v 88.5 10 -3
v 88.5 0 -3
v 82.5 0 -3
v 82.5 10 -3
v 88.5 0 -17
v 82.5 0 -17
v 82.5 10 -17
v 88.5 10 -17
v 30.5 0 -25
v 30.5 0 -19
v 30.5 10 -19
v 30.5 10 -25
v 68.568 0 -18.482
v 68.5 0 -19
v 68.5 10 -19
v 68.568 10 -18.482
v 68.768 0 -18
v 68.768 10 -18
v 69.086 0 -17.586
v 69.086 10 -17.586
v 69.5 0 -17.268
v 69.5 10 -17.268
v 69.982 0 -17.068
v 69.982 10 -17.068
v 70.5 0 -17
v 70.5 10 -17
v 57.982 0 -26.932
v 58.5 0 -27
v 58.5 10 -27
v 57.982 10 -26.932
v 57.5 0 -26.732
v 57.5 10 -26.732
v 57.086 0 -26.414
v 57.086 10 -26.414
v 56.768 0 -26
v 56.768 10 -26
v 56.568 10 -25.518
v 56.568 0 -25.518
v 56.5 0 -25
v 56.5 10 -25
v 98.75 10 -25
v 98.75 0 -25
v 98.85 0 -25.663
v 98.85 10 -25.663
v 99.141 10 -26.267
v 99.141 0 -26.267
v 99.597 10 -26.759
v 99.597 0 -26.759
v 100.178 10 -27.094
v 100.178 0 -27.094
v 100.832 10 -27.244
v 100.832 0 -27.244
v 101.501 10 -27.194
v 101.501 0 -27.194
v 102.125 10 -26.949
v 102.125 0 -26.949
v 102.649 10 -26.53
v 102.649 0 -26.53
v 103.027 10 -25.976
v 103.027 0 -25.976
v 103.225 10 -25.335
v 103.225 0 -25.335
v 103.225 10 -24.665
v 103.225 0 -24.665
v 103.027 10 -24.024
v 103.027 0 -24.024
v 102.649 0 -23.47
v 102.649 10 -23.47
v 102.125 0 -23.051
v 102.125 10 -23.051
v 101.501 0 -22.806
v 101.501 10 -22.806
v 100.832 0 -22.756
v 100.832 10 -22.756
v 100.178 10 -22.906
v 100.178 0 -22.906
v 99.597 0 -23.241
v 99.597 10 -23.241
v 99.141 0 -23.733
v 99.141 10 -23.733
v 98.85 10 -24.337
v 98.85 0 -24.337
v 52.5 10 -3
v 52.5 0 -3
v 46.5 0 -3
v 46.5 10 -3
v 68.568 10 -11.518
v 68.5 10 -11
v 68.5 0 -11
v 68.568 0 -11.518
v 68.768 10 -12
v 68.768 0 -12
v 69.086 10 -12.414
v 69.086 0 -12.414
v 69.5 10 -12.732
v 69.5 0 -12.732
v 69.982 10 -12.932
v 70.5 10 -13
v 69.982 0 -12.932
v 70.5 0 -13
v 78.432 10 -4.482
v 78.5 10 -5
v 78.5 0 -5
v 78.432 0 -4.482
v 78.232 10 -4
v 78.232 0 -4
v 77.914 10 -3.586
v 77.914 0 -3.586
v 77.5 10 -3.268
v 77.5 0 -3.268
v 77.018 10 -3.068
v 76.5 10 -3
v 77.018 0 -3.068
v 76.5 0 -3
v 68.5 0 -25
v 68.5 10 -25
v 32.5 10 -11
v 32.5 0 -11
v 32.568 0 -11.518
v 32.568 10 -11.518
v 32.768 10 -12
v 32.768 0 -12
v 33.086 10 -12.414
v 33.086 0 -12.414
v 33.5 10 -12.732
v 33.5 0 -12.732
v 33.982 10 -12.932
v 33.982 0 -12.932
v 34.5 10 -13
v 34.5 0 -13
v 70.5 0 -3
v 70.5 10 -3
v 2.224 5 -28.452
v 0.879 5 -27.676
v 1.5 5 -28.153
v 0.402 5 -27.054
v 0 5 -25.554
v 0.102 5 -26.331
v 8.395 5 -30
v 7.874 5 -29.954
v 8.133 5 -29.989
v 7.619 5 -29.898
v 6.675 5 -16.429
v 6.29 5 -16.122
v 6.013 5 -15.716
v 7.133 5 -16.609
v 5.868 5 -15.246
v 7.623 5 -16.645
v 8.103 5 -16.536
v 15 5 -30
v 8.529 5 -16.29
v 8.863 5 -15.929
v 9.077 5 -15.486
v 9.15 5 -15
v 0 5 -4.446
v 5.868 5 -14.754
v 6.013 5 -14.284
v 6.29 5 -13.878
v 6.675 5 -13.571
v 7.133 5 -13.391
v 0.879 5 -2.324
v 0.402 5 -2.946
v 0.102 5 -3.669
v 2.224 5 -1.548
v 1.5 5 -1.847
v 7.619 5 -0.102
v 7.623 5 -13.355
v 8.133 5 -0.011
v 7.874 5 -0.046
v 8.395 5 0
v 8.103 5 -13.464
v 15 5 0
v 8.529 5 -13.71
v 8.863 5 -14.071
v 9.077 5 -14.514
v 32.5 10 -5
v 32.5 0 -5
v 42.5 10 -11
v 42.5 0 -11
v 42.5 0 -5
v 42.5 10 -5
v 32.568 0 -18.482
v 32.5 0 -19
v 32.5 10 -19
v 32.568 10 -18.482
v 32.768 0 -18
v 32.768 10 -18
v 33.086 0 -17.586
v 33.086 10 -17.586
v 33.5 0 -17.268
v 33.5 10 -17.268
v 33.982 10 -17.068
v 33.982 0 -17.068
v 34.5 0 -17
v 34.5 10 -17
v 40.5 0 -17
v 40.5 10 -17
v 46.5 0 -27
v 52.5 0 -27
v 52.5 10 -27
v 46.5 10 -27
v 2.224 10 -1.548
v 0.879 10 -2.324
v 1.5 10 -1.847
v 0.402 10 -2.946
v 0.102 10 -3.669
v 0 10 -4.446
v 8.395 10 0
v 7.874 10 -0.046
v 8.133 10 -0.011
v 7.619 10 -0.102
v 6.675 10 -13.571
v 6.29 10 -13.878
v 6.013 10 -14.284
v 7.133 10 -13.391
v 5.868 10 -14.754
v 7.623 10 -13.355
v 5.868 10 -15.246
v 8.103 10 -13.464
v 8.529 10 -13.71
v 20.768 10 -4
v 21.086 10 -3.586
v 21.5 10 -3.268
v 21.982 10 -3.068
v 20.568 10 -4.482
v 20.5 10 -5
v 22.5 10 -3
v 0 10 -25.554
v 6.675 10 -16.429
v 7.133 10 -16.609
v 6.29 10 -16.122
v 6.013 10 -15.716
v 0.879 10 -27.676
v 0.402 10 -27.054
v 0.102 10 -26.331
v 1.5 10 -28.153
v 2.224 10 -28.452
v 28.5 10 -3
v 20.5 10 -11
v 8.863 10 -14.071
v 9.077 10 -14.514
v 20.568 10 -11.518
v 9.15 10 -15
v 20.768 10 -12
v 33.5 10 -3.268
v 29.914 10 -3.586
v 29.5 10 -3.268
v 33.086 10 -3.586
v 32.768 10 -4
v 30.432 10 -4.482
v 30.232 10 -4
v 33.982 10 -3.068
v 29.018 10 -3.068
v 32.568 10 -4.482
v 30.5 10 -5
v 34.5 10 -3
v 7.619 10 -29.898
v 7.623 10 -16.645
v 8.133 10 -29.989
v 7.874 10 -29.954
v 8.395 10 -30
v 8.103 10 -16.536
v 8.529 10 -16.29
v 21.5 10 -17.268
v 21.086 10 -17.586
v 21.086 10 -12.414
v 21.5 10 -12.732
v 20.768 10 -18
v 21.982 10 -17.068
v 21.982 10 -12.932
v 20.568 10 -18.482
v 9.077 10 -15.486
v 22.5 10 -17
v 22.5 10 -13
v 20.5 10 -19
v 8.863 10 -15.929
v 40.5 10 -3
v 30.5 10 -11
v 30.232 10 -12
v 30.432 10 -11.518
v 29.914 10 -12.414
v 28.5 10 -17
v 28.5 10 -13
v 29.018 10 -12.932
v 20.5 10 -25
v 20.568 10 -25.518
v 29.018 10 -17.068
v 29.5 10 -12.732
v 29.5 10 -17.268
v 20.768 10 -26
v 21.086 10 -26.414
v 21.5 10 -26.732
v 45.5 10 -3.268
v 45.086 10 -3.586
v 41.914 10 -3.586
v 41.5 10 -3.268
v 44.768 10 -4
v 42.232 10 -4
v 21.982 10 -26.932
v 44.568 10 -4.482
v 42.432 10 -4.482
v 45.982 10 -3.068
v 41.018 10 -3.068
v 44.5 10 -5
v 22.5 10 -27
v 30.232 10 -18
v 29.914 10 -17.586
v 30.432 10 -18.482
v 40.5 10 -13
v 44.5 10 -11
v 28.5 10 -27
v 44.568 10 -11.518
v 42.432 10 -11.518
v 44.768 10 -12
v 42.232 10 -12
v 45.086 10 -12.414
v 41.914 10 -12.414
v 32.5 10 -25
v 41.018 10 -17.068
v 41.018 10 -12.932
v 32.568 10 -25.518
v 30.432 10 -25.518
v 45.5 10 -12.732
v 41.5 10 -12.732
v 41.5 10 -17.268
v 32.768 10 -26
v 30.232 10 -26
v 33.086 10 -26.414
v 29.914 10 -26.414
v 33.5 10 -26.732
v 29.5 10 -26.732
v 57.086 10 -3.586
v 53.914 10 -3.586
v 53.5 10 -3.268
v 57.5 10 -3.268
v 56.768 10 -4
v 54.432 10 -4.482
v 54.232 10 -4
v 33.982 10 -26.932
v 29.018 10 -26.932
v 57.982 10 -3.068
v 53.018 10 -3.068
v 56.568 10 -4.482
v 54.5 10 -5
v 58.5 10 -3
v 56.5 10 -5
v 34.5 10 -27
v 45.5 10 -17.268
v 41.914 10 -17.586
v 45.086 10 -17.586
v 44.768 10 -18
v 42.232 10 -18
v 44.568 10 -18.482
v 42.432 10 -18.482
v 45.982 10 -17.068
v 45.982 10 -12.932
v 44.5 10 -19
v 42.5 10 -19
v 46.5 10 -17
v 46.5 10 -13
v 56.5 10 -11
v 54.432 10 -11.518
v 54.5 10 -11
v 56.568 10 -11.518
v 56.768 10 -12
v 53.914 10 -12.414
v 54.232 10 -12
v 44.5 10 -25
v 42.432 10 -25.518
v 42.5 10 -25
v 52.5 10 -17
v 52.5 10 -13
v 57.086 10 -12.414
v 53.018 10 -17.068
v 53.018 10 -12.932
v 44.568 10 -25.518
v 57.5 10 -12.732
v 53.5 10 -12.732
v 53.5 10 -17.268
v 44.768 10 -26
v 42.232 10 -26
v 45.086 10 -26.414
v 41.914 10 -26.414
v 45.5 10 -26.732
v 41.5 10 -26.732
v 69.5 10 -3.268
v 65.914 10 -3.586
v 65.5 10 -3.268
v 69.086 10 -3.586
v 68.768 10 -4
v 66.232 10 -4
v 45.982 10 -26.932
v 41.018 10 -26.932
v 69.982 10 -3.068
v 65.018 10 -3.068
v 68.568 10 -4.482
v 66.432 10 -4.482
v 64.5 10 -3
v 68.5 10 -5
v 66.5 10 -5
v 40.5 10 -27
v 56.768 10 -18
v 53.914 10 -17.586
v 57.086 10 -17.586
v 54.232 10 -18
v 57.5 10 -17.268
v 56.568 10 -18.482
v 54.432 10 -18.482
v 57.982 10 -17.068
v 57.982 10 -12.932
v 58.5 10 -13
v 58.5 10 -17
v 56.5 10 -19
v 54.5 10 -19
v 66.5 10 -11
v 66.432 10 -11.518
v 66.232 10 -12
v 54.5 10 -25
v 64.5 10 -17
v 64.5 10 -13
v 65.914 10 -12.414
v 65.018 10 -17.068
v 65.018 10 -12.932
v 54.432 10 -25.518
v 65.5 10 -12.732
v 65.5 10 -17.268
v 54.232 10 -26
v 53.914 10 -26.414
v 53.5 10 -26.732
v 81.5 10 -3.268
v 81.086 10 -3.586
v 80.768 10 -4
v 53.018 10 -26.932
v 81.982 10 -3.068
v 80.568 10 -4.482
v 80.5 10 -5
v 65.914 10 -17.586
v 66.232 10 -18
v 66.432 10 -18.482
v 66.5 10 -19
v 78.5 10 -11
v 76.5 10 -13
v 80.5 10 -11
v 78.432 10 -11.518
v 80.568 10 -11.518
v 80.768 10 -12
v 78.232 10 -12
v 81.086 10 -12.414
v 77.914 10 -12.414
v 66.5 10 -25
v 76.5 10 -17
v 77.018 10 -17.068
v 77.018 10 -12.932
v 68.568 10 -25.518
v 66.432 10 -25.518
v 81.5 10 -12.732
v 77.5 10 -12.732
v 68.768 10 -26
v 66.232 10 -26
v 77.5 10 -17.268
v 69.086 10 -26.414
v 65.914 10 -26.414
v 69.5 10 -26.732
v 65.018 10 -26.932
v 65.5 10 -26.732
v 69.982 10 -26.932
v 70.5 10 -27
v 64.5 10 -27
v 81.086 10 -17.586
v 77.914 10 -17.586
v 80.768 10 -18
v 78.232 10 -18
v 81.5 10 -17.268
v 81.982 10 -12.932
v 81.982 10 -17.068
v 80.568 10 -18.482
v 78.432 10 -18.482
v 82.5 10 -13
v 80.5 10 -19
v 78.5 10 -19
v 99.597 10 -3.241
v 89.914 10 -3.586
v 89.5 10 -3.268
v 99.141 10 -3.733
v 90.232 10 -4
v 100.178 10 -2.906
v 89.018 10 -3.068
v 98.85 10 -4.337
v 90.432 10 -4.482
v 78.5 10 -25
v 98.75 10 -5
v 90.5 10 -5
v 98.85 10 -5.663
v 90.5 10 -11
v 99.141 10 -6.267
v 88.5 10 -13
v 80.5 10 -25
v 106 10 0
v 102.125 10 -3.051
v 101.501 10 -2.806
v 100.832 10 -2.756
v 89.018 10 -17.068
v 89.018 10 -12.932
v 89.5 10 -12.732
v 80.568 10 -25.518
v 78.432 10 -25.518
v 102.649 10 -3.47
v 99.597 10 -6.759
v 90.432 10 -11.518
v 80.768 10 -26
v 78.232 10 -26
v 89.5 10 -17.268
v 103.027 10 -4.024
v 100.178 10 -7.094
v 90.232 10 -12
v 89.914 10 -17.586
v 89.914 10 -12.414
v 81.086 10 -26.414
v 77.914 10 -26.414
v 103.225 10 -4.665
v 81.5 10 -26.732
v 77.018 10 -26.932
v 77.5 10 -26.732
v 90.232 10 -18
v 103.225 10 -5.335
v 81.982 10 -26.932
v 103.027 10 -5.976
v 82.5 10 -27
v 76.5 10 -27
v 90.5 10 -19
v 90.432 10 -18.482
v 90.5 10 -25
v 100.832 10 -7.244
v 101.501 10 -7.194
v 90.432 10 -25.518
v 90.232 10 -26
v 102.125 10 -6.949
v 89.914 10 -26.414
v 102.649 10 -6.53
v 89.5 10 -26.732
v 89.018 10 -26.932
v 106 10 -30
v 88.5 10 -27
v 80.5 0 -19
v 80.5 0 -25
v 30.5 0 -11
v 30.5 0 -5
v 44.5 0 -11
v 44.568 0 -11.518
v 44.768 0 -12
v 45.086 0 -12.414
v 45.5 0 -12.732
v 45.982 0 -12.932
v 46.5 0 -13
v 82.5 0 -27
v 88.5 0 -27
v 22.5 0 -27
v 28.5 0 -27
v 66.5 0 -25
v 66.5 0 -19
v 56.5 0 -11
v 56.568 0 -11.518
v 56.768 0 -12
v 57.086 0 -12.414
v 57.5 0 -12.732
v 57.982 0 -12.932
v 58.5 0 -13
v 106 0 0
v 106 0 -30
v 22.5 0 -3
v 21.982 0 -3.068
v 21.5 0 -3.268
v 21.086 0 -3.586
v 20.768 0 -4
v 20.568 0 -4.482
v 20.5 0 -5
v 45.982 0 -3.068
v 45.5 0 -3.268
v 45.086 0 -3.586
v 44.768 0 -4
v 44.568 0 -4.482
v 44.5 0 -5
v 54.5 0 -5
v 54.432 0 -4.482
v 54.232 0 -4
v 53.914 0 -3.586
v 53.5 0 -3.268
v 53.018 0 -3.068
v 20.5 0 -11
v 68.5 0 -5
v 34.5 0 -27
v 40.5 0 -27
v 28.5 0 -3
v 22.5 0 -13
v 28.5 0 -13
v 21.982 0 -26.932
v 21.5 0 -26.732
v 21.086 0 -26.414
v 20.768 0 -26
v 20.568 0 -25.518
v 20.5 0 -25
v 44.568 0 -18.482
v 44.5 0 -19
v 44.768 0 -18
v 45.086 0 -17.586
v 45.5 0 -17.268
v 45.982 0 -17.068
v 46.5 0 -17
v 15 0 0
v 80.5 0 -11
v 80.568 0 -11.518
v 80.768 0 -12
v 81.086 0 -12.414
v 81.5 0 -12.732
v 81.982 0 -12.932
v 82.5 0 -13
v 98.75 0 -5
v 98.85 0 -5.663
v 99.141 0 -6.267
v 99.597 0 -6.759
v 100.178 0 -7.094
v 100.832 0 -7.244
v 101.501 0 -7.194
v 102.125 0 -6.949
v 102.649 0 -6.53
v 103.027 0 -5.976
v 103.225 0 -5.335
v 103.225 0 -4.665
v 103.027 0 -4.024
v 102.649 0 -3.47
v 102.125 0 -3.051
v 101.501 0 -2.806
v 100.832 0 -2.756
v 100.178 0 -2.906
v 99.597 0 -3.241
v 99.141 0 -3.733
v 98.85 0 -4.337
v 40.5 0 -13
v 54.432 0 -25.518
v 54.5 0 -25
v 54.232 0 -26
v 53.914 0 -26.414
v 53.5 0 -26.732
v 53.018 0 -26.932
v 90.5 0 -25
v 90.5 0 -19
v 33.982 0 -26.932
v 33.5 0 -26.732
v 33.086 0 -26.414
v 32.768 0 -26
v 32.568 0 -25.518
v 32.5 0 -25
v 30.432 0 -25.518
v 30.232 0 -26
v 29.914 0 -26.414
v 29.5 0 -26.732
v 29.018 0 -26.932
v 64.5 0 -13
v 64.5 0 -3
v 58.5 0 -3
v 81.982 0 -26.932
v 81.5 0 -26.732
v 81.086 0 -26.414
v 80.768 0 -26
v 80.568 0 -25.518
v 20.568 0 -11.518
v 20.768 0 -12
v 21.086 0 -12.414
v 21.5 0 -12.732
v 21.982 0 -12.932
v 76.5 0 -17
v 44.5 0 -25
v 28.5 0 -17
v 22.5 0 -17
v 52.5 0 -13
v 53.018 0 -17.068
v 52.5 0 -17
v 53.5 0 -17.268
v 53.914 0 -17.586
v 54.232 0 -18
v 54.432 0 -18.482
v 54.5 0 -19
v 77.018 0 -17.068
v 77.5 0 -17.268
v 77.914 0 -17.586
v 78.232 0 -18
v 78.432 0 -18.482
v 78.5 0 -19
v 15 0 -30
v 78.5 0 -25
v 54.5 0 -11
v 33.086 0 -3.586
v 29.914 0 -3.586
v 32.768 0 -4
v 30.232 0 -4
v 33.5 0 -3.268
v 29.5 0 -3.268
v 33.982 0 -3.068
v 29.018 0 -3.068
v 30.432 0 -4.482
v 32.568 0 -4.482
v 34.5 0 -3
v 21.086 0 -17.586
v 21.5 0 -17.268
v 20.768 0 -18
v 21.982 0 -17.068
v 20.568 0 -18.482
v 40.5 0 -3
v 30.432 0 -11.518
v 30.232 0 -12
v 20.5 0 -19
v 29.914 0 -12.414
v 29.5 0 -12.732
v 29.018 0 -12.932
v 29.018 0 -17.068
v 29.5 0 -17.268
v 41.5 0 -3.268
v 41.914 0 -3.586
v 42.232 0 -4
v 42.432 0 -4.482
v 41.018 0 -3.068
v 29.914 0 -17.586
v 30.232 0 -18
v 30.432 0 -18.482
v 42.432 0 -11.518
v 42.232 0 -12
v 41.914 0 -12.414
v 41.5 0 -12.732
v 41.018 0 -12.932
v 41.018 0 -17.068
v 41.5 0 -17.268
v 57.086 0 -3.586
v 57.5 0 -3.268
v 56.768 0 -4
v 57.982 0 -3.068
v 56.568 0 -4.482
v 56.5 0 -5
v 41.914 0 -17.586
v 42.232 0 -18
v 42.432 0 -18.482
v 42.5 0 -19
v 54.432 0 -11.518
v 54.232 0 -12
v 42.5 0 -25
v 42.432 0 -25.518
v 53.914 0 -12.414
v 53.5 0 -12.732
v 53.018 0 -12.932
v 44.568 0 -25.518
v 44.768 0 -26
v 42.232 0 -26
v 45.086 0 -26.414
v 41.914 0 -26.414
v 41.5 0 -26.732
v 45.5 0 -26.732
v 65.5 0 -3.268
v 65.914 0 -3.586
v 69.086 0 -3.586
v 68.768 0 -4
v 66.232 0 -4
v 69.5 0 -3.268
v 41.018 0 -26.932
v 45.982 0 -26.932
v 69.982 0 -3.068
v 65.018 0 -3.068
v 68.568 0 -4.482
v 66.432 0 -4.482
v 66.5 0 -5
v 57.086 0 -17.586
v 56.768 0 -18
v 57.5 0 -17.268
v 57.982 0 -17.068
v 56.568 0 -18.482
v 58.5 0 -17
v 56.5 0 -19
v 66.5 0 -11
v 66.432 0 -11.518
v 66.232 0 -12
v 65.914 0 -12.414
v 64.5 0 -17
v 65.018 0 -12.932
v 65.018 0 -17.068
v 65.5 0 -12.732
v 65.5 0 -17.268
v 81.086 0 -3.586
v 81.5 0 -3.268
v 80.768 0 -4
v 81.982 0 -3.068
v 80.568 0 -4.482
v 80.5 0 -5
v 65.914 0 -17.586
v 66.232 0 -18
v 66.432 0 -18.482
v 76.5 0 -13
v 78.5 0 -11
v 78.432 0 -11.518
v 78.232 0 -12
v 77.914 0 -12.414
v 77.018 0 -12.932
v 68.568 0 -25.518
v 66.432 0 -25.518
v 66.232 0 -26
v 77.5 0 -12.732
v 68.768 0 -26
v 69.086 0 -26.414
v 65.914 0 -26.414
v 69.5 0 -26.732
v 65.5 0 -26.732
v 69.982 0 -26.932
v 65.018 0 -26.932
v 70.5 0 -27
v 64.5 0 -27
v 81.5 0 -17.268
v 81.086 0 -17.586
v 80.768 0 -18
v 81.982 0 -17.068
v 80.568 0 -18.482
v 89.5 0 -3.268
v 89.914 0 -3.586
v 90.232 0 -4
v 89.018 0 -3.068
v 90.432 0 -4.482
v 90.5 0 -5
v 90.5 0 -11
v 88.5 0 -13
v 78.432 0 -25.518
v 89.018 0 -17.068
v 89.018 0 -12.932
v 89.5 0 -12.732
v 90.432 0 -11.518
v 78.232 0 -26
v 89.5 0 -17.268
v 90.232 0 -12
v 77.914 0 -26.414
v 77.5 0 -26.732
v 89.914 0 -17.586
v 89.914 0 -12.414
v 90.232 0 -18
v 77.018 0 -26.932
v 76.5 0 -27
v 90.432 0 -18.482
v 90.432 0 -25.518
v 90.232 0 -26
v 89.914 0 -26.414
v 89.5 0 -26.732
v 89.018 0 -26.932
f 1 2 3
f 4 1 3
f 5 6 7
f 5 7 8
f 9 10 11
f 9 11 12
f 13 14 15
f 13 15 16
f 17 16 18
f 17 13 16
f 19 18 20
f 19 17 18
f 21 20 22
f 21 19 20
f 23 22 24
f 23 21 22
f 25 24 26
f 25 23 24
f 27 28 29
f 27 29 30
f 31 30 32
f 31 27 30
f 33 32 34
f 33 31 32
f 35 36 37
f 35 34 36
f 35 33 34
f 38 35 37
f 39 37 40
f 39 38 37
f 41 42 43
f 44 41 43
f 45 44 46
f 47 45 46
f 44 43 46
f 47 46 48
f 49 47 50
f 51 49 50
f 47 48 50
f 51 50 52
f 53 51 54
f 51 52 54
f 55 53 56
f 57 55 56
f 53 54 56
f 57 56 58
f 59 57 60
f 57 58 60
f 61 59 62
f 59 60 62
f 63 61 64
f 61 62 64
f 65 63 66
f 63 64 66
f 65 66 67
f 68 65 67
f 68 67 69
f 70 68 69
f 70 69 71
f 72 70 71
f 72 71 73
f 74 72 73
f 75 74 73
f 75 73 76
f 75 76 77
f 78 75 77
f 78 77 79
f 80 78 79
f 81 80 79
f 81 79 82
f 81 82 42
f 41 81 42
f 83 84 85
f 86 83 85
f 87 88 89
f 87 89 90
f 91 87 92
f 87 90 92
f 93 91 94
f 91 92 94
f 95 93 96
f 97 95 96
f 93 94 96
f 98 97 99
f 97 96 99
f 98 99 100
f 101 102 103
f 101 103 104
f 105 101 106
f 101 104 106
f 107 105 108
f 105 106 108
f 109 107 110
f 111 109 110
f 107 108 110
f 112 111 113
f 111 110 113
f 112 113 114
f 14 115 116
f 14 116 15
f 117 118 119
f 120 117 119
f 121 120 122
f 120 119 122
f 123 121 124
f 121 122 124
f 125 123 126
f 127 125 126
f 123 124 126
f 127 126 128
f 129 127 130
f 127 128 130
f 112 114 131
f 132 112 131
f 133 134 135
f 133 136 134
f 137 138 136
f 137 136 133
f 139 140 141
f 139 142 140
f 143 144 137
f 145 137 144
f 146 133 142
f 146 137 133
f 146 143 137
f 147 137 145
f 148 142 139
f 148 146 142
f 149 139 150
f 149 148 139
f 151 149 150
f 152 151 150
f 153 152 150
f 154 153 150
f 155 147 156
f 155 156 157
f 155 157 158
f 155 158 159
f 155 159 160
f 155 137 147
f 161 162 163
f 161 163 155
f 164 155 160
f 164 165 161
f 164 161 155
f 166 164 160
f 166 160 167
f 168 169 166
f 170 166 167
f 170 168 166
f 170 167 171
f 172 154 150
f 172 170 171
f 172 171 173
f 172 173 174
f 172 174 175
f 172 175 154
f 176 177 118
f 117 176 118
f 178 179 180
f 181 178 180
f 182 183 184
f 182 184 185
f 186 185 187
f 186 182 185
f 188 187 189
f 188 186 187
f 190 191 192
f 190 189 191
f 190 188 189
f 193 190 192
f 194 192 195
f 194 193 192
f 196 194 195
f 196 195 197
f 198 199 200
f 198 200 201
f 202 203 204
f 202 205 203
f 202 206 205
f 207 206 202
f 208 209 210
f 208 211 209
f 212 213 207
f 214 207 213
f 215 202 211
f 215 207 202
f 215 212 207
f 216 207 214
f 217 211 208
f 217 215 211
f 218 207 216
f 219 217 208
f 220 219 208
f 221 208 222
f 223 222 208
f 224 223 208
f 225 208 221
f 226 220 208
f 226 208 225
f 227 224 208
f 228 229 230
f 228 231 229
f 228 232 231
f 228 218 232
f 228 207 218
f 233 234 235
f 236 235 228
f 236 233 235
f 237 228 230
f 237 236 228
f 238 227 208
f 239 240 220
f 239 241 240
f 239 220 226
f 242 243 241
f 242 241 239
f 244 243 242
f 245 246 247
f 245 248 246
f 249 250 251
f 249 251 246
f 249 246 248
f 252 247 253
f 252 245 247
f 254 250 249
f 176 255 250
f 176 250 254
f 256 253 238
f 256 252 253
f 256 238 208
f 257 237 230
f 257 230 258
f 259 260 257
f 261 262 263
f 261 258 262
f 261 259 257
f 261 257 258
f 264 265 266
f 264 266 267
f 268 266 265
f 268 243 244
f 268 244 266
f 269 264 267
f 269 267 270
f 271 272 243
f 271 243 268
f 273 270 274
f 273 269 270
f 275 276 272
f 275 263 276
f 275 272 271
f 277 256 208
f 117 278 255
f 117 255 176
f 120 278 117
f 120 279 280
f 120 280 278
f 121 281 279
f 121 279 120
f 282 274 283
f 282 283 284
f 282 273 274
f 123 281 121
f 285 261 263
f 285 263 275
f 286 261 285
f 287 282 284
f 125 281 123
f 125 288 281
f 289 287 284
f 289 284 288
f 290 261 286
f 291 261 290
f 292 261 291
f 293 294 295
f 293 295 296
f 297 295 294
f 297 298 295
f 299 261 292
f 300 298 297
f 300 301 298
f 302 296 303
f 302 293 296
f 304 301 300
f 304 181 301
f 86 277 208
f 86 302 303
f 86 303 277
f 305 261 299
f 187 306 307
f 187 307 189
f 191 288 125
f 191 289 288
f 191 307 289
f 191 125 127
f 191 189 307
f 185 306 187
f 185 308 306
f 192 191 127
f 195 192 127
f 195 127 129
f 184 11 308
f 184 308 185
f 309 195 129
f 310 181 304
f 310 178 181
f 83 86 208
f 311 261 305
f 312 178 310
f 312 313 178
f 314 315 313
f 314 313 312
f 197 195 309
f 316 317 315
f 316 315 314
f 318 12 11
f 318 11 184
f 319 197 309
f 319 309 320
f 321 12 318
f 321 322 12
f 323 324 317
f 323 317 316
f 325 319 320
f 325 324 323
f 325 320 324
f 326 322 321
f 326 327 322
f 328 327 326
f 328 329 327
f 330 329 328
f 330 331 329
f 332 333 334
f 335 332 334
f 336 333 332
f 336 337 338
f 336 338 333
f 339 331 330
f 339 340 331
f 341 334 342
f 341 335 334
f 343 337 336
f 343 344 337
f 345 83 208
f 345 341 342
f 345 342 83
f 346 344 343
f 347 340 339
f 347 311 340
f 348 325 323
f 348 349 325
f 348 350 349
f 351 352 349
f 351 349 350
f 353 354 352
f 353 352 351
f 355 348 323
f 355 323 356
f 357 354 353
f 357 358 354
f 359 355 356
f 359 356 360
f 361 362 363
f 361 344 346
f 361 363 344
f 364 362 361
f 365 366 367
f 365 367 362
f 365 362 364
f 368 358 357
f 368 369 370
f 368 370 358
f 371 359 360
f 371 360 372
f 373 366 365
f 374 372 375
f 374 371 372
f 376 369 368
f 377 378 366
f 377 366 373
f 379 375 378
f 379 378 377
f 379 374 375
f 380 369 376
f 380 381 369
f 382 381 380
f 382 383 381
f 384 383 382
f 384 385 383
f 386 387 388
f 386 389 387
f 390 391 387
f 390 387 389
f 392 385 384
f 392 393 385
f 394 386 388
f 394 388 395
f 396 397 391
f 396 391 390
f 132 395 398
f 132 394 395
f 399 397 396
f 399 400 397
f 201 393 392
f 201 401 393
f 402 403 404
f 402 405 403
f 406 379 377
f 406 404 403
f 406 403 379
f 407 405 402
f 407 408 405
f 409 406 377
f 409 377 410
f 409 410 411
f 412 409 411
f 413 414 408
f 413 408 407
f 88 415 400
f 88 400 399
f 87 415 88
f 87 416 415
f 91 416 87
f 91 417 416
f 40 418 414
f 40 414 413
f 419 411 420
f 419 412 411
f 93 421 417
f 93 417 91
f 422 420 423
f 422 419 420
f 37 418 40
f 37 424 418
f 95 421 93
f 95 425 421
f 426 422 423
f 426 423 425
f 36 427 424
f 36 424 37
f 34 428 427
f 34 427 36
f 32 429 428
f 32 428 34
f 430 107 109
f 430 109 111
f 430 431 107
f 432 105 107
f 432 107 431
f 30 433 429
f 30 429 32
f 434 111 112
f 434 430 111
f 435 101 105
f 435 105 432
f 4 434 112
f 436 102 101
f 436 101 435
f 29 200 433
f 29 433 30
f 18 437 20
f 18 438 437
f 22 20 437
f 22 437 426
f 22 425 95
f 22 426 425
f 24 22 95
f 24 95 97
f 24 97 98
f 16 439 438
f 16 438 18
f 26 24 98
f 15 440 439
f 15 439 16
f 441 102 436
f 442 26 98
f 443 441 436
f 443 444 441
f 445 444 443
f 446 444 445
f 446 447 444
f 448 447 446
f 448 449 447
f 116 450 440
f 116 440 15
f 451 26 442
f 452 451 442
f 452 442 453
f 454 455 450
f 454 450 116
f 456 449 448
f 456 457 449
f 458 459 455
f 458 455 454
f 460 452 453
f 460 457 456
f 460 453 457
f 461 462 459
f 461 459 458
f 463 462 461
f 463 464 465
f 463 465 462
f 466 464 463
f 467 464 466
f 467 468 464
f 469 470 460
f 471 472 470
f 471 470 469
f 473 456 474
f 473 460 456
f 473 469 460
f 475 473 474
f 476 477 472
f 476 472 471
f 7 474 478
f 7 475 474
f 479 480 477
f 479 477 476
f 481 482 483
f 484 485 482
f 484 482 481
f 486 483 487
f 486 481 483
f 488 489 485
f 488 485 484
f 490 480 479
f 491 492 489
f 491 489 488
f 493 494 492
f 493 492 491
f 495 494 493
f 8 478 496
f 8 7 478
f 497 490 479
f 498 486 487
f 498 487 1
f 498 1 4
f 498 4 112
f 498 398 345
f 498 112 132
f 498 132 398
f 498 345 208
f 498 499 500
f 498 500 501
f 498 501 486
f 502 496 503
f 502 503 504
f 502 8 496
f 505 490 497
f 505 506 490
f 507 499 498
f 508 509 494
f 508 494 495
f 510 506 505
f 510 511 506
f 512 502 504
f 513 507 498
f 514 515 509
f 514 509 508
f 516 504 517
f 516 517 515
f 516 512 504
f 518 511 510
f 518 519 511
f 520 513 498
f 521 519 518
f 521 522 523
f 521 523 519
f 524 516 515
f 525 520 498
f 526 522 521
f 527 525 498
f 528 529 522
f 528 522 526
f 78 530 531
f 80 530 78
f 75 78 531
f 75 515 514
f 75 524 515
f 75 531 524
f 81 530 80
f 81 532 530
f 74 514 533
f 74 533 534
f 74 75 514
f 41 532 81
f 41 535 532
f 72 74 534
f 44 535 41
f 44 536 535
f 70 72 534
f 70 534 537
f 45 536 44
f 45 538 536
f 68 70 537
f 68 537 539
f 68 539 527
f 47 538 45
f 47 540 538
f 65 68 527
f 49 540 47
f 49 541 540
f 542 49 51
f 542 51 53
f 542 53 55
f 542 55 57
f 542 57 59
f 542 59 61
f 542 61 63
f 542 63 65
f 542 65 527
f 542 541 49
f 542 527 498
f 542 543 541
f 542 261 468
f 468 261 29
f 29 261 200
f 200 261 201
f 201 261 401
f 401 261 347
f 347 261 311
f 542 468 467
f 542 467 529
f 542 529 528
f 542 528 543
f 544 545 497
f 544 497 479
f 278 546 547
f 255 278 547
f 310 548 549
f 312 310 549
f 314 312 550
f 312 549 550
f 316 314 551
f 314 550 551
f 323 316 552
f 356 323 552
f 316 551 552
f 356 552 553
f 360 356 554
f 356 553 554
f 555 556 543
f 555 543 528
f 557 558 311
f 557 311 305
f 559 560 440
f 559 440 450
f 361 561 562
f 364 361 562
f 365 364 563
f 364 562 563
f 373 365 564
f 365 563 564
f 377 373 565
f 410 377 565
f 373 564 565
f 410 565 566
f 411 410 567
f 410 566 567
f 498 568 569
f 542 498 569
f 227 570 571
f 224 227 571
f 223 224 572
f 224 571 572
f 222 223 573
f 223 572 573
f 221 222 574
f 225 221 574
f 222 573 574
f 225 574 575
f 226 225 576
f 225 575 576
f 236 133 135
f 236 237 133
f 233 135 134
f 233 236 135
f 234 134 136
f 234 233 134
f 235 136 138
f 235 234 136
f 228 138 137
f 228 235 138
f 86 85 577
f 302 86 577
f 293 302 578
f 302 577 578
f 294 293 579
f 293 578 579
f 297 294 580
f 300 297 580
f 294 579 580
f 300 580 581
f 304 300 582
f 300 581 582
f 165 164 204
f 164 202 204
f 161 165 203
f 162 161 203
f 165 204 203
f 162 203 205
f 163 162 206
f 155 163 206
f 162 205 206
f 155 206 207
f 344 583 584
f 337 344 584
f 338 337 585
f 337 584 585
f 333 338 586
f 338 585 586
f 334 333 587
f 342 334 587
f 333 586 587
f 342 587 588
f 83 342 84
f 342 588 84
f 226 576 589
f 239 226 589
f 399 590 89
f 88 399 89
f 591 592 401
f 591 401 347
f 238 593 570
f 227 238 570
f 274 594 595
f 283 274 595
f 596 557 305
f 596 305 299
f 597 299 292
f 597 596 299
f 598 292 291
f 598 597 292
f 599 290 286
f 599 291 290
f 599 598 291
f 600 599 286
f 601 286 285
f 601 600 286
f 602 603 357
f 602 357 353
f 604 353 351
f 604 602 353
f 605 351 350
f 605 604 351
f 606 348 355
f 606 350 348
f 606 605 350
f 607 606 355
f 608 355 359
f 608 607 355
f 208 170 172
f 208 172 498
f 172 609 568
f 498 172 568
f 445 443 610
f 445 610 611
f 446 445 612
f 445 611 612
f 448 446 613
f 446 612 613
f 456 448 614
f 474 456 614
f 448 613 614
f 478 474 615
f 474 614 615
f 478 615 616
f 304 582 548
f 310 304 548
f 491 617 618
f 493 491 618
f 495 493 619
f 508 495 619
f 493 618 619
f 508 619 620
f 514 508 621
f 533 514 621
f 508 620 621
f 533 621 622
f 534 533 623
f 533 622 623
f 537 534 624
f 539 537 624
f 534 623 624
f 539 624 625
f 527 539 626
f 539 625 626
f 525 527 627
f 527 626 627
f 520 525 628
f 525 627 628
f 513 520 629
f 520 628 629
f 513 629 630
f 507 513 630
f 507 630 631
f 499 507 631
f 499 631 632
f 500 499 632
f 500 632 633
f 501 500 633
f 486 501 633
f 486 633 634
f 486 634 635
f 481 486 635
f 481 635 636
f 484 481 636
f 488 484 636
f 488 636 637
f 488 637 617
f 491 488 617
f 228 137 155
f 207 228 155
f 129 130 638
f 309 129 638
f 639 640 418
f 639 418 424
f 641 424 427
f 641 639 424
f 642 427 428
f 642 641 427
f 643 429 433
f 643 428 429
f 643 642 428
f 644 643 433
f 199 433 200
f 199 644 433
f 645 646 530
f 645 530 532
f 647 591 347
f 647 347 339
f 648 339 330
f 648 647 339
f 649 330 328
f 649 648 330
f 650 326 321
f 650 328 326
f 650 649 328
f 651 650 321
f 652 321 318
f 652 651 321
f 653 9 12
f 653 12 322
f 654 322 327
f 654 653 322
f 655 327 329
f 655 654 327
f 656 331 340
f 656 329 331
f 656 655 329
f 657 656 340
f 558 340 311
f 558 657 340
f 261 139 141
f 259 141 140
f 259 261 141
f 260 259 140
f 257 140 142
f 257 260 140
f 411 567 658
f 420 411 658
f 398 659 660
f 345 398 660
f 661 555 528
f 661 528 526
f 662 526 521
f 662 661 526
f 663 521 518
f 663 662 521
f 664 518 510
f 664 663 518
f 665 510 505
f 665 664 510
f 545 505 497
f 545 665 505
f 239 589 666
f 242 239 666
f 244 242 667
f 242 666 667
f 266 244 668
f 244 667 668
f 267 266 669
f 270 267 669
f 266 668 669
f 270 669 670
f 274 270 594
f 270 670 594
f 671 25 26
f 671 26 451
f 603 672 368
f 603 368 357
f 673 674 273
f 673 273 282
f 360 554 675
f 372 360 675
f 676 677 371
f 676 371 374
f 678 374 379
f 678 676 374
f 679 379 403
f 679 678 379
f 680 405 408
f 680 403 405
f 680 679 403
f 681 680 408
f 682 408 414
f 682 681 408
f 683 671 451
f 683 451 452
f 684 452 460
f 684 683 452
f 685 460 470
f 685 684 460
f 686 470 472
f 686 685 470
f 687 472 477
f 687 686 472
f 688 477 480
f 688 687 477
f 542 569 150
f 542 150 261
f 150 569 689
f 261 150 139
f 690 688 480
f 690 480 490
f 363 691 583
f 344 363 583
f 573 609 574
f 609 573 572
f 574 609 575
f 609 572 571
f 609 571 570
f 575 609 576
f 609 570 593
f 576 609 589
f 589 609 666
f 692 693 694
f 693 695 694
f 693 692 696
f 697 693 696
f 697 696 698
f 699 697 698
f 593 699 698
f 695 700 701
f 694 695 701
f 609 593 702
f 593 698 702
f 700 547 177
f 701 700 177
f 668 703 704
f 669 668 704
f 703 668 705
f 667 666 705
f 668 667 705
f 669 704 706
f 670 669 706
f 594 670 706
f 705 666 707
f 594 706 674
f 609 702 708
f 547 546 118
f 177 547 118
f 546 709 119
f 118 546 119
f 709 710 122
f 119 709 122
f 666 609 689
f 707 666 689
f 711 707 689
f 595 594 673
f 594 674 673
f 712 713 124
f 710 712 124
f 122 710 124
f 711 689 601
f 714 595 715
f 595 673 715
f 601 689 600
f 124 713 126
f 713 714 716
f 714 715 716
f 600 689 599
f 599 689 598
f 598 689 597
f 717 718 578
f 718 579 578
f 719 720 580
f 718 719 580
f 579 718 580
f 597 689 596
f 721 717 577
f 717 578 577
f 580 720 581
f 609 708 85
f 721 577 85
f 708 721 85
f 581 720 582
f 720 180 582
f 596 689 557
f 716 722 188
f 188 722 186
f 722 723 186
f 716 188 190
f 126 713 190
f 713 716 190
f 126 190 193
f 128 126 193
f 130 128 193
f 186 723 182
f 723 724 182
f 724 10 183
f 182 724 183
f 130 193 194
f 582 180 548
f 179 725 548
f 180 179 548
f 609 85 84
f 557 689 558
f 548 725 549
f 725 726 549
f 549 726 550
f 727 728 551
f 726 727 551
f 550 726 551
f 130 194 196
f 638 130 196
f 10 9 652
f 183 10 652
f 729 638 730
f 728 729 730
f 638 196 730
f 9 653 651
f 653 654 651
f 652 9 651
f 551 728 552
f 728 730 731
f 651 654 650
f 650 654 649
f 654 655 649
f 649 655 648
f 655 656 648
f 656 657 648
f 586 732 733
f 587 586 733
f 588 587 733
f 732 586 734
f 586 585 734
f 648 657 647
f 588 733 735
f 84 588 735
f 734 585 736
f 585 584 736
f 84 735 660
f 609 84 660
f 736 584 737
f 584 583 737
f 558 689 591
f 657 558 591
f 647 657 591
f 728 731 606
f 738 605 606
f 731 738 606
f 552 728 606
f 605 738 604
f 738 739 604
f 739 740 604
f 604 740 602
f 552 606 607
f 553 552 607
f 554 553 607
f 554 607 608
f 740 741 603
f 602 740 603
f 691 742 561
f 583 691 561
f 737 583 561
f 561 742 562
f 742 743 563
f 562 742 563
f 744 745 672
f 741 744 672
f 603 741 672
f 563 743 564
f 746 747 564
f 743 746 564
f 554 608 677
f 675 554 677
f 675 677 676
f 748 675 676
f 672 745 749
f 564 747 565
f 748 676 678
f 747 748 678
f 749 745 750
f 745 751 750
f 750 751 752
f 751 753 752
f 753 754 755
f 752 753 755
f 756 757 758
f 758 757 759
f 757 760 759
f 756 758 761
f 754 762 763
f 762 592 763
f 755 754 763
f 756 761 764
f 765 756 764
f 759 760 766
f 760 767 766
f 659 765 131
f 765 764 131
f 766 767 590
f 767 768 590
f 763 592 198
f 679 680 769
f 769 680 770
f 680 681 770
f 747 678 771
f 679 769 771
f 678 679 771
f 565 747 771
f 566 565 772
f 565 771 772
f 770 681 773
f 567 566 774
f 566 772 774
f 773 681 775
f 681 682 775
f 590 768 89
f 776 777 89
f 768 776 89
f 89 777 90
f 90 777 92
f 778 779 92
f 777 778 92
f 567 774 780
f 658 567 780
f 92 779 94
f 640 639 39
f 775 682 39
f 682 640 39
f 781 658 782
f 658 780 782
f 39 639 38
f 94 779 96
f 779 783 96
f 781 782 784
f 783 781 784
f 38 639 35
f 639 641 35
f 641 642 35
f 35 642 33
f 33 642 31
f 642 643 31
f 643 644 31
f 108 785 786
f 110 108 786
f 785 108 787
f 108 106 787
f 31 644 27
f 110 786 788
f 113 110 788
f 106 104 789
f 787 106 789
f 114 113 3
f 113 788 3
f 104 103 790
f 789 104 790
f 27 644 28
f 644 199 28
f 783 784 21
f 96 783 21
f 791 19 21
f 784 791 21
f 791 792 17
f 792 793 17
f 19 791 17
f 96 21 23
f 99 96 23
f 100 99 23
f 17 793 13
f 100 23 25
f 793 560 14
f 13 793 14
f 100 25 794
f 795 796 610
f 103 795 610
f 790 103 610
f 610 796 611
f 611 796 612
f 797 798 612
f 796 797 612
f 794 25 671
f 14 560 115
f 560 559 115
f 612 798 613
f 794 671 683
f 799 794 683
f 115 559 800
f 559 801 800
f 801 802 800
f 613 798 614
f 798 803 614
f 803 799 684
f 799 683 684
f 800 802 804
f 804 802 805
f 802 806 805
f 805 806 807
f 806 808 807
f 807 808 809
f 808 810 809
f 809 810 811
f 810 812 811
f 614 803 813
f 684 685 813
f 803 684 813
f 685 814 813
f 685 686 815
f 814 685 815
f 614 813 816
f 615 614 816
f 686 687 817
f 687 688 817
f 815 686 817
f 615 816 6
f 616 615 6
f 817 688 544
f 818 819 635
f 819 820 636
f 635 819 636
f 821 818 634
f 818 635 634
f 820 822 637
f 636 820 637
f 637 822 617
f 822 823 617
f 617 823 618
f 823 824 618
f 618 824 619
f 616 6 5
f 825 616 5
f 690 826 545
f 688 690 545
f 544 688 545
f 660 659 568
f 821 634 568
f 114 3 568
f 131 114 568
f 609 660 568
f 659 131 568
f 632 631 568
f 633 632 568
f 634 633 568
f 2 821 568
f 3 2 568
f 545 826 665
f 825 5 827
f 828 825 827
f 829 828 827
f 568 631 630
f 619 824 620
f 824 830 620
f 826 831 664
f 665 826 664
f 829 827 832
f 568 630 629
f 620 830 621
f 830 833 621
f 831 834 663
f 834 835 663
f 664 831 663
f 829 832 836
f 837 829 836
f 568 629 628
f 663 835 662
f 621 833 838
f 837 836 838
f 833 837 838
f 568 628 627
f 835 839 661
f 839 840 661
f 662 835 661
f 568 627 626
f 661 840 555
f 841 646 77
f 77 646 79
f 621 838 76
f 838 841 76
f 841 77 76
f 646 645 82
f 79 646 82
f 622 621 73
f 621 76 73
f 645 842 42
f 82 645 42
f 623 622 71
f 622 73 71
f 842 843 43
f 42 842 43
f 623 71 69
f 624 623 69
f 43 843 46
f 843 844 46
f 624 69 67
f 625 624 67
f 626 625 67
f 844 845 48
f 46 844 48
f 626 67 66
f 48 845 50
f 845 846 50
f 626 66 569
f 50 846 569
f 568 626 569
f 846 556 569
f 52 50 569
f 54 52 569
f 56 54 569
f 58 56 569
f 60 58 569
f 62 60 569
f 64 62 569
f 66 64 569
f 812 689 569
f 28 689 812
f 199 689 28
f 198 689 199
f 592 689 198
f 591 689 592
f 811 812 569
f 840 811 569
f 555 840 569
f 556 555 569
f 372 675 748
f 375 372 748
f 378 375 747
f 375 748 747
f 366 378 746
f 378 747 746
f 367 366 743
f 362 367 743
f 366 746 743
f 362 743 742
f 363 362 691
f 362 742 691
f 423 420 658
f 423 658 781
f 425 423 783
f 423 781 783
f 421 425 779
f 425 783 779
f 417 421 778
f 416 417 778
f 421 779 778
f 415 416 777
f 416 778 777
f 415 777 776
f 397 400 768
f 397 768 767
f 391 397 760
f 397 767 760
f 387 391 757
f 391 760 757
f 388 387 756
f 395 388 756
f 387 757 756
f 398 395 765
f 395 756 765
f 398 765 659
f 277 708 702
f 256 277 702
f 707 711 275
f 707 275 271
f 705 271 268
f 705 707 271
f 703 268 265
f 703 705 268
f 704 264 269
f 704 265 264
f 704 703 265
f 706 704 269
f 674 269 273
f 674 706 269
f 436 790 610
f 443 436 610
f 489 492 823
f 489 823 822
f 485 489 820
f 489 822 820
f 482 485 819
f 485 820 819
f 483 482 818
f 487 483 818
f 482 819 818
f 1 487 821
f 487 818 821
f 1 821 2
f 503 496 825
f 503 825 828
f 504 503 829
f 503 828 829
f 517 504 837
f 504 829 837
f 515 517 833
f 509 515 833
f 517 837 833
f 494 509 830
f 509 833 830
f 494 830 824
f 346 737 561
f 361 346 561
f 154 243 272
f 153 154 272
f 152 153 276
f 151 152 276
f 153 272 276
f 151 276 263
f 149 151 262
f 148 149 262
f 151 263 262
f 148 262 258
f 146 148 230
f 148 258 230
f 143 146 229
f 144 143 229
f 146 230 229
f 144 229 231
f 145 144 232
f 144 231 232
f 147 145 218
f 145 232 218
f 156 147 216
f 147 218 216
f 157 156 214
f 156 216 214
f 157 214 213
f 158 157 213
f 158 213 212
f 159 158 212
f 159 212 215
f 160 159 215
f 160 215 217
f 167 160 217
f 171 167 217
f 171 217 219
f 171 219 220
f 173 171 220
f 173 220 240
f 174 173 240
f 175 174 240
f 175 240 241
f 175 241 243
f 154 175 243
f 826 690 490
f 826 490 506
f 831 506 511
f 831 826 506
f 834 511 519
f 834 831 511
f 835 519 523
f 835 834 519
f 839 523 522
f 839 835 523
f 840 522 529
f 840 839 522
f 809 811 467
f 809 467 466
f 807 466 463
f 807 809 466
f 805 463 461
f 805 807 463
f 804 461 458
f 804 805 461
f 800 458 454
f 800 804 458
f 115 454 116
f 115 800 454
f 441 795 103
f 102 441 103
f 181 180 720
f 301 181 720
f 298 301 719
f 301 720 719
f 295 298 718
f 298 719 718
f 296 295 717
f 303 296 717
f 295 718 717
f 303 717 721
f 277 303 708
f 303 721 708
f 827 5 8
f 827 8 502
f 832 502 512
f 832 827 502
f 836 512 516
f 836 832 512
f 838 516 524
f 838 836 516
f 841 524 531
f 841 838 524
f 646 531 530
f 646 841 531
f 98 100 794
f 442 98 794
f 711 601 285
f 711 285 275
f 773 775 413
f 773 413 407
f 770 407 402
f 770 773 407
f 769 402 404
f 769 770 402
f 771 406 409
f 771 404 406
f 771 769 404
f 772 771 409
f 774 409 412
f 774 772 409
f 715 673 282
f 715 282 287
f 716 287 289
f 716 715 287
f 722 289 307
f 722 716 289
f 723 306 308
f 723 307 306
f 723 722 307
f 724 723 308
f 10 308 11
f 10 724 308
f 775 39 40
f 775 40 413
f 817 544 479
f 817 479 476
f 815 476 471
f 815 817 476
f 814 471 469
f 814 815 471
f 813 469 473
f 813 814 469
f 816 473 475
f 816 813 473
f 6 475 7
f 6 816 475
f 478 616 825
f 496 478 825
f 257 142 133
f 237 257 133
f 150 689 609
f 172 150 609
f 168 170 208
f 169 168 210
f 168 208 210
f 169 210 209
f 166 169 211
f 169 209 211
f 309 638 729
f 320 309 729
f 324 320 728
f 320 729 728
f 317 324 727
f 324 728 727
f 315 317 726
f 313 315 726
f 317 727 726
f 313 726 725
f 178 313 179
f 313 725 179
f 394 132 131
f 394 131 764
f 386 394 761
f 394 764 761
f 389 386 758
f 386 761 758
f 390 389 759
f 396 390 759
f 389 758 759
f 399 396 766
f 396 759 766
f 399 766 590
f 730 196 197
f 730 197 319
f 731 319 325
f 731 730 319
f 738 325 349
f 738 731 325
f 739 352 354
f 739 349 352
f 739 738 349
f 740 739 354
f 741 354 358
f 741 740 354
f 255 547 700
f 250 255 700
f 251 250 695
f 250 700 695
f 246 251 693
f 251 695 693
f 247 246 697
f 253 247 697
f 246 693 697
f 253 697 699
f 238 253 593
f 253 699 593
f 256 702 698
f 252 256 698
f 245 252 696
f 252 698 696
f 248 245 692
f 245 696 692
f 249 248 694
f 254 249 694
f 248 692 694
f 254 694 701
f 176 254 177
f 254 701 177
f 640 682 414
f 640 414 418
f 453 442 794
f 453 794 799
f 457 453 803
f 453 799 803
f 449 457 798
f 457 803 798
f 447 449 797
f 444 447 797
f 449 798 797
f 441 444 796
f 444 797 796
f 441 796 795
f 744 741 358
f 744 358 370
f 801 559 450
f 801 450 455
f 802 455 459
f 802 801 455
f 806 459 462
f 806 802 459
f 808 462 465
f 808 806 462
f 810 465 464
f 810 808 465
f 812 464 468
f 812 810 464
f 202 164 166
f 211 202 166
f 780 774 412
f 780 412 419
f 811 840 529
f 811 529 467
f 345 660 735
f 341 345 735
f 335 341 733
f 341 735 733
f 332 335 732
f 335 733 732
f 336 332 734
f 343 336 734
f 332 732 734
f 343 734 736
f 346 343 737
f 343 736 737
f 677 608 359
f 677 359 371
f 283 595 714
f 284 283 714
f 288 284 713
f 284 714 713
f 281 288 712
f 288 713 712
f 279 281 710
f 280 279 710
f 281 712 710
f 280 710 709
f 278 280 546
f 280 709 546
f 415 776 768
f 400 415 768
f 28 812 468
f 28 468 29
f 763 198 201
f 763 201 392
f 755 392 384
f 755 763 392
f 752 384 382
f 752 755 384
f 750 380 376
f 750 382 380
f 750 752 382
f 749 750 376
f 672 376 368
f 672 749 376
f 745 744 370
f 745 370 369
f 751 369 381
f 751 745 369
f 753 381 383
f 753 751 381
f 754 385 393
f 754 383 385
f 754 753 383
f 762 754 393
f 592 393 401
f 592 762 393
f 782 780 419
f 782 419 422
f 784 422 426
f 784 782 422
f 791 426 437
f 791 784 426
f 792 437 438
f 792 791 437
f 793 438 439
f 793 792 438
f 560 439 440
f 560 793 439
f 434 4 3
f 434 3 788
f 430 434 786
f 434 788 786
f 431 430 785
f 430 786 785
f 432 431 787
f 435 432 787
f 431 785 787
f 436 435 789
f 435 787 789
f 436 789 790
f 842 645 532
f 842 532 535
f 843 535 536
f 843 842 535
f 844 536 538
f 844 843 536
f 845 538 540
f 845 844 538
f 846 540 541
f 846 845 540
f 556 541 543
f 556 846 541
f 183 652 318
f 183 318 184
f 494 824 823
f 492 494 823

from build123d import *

# Parameters (mm, degrees)
EXTRUDE_1_DEPTH     = 10
SKETCH_4_W          = 15
SKETCH_4_H          = 30
CUT_EXTRUDE_2_DEPTH = 5
FILLET_1_R          = 3
CUT_EXTRUDE_3_DEPTH = 111.616454472
HOLE_WIZARD_M41_D   = 4.5
M4X0_71_D           = 3.3


with BuildPart() as part:
    # Эскиз1 → Бобышка-Вытянуть1 (new body)
    with BuildSketch(Plane(origin=(0, 0, 0), x_dir=(1, 0, 0), z_dir=(0, 1, 0))):
        Polygon((15, 0), (106, 0), (106, 30), (15, 30), (8, 30), (0, 27.856406461), (0, 2.143593539), (8, 0), align=None)
    extrude(amount=EXTRUDE_1_DEPTH)

    # Эскиз4 → Вырез-Вытянуть2 (cut)
    with BuildSketch(Plane.XZ):
        with Locations((7.5, -15)):
            Rectangle(SKETCH_4_W, SKETCH_4_H)
    extrude(amount=-CUT_EXTRUDE_2_DEPTH, mode=Mode.SUBTRACT)

    # Скругление1
    fillet_1_edges = [part.edges().sort_by_distance(p)[0] for p in [
        (8, 7.5, 0),
        (0, 7.5, -2.143593539),
        (0, 7.5, -27.856406461),
        (8, 7.5, -30),
    ]]
    fillet(fillet_1_edges, radius=FILLET_1_R)

    # Эскиз5 → Вырез-Вытянуть3 (cut, through all)
    with BuildSketch(Plane.XZ):
        with BuildLine():
            Line((22.5, -17), (28.5, -17))
            ThreePointArc((28.5, -17), (29.914213562, -17.585786438), (30.5, -19))
            Line((30.5, -19), (30.5, -25))
            ThreePointArc((30.5, -25), (29.914213562, -26.414213562), (28.5, -27))
            Line((28.5, -27), (22.5, -27))
            ThreePointArc((22.5, -27), (21.085786438, -26.414213562), (20.5, -25))
            Line((20.5, -25), (20.5, -19))
            ThreePointArc((20.5, -19), (21.085786438, -17.585786438), (22.5, -17))
        make_face()
        with BuildLine():
            Line((34.5, -17), (40.5, -17))
            ThreePointArc((40.5, -17), (41.914213562, -17.585786438), (42.5, -19))
            Line((42.5, -19), (42.5, -25))
            ThreePointArc((42.5, -25), (41.914213562, -26.414213562), (40.5, -27))
            Line((40.5, -27), (34.5, -27))
            ThreePointArc((34.5, -27), (33.085786438, -26.414213562), (32.5, -25))
            Line((32.5, -25), (32.5, -19))
            ThreePointArc((32.5, -19), (33.085786438, -17.585786438), (34.5, -17))
        make_face()
        with BuildLine():
            Line((46.5, -17), (52.5, -17))
            ThreePointArc((52.5, -17), (53.914213562, -17.585786438), (54.5, -19))
            Line((54.5, -19), (54.5, -25))
            ThreePointArc((54.5, -25), (53.914213562, -26.414213562), (52.5, -27))
            Line((52.5, -27), (46.5, -27))
            ThreePointArc((46.5, -27), (45.085786438, -26.414213562), (44.5, -25))
            Line((44.5, -25), (44.5, -19))
            ThreePointArc((44.5, -19), (45.085786438, -17.585786438), (46.5, -17))
        make_face()
        with BuildLine():
            Line((58.5, -17), (64.5, -17))
            ThreePointArc((64.5, -17), (65.914213562, -17.585786438), (66.5, -19))
            Line((66.5, -19), (66.5, -25))
            ThreePointArc((66.5, -25), (65.914213562, -26.414213562), (64.5, -27))
            Line((64.5, -27), (58.5, -27))
            ThreePointArc((58.5, -27), (57.085786438, -26.414213562), (56.5, -25))
            Line((56.5, -25), (56.5, -19))
            ThreePointArc((56.5, -19), (57.085786438, -17.585786438), (58.5, -17))
        make_face()
        with BuildLine():
            Line((70.5, -17), (76.5, -17))
            ThreePointArc((76.5, -17), (77.914213562, -17.585786438), (78.5, -19))
            Line((78.5, -19), (78.5, -25))
            ThreePointArc((78.5, -25), (77.914213562, -26.414213562), (76.5, -27))
            Line((76.5, -27), (70.5, -27))
            ThreePointArc((70.5, -27), (69.085786438, -26.414213562), (68.5, -25))
            Line((68.5, -25), (68.5, -19))
            ThreePointArc((68.5, -19), (69.085786438, -17.585786438), (70.5, -17))
        make_face()
        with BuildLine():
            Line((82.5, -17), (88.5, -17))
            ThreePointArc((88.5, -17), (89.914213562, -17.585786438), (90.5, -19))
            Line((90.5, -19), (90.5, -25))
            ThreePointArc((90.5, -25), (89.914213562, -26.414213562), (88.5, -27))
            Line((88.5, -27), (82.5, -27))
            ThreePointArc((82.5, -27), (81.085786438, -26.414213562), (80.5, -25))
            Line((80.5, -25), (80.5, -19))
            ThreePointArc((80.5, -19), (81.085786438, -17.585786438), (82.5, -17))
        make_face()
        with BuildLine():
            Line((90.5, -11), (90.5, -5))
            ThreePointArc((90.5, -5), (89.914213562, -3.585786438), (88.5, -3))
            Line((88.5, -3), (82.5, -3))
            ThreePointArc((82.5, -3), (81.085786438, -3.585786438), (80.5, -5))
            Line((80.5, -5), (80.5, -11))
            ThreePointArc((80.5, -11), (81.085786438, -12.414213562), (82.5, -13))
            Line((82.5, -13), (88.5, -13))
            ThreePointArc((88.5, -13), (89.914213562, -12.414213562), (90.5, -11))
        make_face()
        with BuildLine():
            Line((78.5, -11), (78.5, -5))
            ThreePointArc((78.5, -5), (77.914213562, -3.585786438), (76.5, -3))
            Line((76.5, -3), (70.5, -3))
            ThreePointArc((70.5, -3), (69.085786438, -3.585786438), (68.5, -5))
            Line((68.5, -5), (68.5, -11))
            ThreePointArc((68.5, -11), (69.085786438, -12.414213562), (70.5, -13))
            Line((70.5, -13), (76.5, -13))
            ThreePointArc((76.5, -13), (77.914213562, -12.414213562), (78.5, -11))
        make_face()
        with BuildLine():
            Line((66.5, -11), (66.5, -5))
            ThreePointArc((66.5, -5), (65.914213562, -3.585786438), (64.5, -3))
            Line((64.5, -3), (58.5, -3))
            ThreePointArc((58.5, -3), (57.085786438, -3.585786438), (56.5, -5))
            Line((56.5, -5), (56.5, -11))
            ThreePointArc((56.5, -11), (57.085786438, -12.414213562), (58.5, -13))
            Line((58.5, -13), (64.5, -13))
            ThreePointArc((64.5, -13), (65.914213562, -12.414213562), (66.5, -11))
        make_face()
        with BuildLine():
            Line((54.5, -11), (54.5, -5))
            ThreePointArc((54.5, -5), (53.914213562, -3.585786438), (52.5, -3))
            Line((52.5, -3), (46.5, -3))
            ThreePointArc((46.5, -3), (45.085786438, -3.585786438), (44.5, -5))
            Line((44.5, -5), (44.5, -11))
            ThreePointArc((44.5, -11), (45.085786438, -12.414213562), (46.5, -13))
            Line((46.5, -13), (52.5, -13))
            ThreePointArc((52.5, -13), (53.914213562, -12.414213562), (54.5, -11))
        make_face()
        with BuildLine():
            Line((42.5, -11), (42.5, -5))
            ThreePointArc((42.5, -5), (41.914213562, -3.585786438), (40.5, -3))
            Line((40.5, -3), (34.5, -3))
            ThreePointArc((34.5, -3), (33.085786438, -3.585786438), (32.5, -5))
            Line((32.5, -5), (32.5, -11))
            ThreePointArc((32.5, -11), (33.085786438, -12.414213562), (34.5, -13))
            Line((34.5, -13), (40.5, -13))
            ThreePointArc((40.5, -13), (41.914213562, -12.414213562), (42.5, -11))
        make_face()
        with BuildLine():
            Line((30.5, -11), (30.5, -5))
            ThreePointArc((30.5, -5), (29.914213562, -3.585786438), (28.5, -3))
            Line((28.5, -3), (22.5, -3))
            ThreePointArc((22.5, -3), (21.085786438, -3.585786438), (20.5, -5))
            Line((20.5, -5), (20.5, -11))
            ThreePointArc((20.5, -11), (21.085786438, -12.414213562), (22.5, -13))
            Line((22.5, -13), (28.5, -13))
            ThreePointArc((28.5, -13), (29.914213562, -12.414213562), (30.5, -11))
        make_face()
    extrude(amount=-CUT_EXTRUDE_3_DEPTH, mode=Mode.SUBTRACT)

    # Отверстие с зазором M41 (through all)
    with Locations(Plane(origin=(0, 10, 0), x_dir=(1, 0, 0), z_dir=(0, 1, 0))):
        with Locations((101, 25), (101, 5)):
            Hole(HOLE_WIZARD_M41_D / 2)

    # Отверстие обработанное метчиком M4x0.71 (through all)
    with Locations(Plane(origin=(0, 5, 0), x_dir=(-1, 0, 0), z_dir=(0, -1, 0))):
        with Locations((-7.5, 15)):
            Hole(M4X0_71_D / 2)


solid = part.part
